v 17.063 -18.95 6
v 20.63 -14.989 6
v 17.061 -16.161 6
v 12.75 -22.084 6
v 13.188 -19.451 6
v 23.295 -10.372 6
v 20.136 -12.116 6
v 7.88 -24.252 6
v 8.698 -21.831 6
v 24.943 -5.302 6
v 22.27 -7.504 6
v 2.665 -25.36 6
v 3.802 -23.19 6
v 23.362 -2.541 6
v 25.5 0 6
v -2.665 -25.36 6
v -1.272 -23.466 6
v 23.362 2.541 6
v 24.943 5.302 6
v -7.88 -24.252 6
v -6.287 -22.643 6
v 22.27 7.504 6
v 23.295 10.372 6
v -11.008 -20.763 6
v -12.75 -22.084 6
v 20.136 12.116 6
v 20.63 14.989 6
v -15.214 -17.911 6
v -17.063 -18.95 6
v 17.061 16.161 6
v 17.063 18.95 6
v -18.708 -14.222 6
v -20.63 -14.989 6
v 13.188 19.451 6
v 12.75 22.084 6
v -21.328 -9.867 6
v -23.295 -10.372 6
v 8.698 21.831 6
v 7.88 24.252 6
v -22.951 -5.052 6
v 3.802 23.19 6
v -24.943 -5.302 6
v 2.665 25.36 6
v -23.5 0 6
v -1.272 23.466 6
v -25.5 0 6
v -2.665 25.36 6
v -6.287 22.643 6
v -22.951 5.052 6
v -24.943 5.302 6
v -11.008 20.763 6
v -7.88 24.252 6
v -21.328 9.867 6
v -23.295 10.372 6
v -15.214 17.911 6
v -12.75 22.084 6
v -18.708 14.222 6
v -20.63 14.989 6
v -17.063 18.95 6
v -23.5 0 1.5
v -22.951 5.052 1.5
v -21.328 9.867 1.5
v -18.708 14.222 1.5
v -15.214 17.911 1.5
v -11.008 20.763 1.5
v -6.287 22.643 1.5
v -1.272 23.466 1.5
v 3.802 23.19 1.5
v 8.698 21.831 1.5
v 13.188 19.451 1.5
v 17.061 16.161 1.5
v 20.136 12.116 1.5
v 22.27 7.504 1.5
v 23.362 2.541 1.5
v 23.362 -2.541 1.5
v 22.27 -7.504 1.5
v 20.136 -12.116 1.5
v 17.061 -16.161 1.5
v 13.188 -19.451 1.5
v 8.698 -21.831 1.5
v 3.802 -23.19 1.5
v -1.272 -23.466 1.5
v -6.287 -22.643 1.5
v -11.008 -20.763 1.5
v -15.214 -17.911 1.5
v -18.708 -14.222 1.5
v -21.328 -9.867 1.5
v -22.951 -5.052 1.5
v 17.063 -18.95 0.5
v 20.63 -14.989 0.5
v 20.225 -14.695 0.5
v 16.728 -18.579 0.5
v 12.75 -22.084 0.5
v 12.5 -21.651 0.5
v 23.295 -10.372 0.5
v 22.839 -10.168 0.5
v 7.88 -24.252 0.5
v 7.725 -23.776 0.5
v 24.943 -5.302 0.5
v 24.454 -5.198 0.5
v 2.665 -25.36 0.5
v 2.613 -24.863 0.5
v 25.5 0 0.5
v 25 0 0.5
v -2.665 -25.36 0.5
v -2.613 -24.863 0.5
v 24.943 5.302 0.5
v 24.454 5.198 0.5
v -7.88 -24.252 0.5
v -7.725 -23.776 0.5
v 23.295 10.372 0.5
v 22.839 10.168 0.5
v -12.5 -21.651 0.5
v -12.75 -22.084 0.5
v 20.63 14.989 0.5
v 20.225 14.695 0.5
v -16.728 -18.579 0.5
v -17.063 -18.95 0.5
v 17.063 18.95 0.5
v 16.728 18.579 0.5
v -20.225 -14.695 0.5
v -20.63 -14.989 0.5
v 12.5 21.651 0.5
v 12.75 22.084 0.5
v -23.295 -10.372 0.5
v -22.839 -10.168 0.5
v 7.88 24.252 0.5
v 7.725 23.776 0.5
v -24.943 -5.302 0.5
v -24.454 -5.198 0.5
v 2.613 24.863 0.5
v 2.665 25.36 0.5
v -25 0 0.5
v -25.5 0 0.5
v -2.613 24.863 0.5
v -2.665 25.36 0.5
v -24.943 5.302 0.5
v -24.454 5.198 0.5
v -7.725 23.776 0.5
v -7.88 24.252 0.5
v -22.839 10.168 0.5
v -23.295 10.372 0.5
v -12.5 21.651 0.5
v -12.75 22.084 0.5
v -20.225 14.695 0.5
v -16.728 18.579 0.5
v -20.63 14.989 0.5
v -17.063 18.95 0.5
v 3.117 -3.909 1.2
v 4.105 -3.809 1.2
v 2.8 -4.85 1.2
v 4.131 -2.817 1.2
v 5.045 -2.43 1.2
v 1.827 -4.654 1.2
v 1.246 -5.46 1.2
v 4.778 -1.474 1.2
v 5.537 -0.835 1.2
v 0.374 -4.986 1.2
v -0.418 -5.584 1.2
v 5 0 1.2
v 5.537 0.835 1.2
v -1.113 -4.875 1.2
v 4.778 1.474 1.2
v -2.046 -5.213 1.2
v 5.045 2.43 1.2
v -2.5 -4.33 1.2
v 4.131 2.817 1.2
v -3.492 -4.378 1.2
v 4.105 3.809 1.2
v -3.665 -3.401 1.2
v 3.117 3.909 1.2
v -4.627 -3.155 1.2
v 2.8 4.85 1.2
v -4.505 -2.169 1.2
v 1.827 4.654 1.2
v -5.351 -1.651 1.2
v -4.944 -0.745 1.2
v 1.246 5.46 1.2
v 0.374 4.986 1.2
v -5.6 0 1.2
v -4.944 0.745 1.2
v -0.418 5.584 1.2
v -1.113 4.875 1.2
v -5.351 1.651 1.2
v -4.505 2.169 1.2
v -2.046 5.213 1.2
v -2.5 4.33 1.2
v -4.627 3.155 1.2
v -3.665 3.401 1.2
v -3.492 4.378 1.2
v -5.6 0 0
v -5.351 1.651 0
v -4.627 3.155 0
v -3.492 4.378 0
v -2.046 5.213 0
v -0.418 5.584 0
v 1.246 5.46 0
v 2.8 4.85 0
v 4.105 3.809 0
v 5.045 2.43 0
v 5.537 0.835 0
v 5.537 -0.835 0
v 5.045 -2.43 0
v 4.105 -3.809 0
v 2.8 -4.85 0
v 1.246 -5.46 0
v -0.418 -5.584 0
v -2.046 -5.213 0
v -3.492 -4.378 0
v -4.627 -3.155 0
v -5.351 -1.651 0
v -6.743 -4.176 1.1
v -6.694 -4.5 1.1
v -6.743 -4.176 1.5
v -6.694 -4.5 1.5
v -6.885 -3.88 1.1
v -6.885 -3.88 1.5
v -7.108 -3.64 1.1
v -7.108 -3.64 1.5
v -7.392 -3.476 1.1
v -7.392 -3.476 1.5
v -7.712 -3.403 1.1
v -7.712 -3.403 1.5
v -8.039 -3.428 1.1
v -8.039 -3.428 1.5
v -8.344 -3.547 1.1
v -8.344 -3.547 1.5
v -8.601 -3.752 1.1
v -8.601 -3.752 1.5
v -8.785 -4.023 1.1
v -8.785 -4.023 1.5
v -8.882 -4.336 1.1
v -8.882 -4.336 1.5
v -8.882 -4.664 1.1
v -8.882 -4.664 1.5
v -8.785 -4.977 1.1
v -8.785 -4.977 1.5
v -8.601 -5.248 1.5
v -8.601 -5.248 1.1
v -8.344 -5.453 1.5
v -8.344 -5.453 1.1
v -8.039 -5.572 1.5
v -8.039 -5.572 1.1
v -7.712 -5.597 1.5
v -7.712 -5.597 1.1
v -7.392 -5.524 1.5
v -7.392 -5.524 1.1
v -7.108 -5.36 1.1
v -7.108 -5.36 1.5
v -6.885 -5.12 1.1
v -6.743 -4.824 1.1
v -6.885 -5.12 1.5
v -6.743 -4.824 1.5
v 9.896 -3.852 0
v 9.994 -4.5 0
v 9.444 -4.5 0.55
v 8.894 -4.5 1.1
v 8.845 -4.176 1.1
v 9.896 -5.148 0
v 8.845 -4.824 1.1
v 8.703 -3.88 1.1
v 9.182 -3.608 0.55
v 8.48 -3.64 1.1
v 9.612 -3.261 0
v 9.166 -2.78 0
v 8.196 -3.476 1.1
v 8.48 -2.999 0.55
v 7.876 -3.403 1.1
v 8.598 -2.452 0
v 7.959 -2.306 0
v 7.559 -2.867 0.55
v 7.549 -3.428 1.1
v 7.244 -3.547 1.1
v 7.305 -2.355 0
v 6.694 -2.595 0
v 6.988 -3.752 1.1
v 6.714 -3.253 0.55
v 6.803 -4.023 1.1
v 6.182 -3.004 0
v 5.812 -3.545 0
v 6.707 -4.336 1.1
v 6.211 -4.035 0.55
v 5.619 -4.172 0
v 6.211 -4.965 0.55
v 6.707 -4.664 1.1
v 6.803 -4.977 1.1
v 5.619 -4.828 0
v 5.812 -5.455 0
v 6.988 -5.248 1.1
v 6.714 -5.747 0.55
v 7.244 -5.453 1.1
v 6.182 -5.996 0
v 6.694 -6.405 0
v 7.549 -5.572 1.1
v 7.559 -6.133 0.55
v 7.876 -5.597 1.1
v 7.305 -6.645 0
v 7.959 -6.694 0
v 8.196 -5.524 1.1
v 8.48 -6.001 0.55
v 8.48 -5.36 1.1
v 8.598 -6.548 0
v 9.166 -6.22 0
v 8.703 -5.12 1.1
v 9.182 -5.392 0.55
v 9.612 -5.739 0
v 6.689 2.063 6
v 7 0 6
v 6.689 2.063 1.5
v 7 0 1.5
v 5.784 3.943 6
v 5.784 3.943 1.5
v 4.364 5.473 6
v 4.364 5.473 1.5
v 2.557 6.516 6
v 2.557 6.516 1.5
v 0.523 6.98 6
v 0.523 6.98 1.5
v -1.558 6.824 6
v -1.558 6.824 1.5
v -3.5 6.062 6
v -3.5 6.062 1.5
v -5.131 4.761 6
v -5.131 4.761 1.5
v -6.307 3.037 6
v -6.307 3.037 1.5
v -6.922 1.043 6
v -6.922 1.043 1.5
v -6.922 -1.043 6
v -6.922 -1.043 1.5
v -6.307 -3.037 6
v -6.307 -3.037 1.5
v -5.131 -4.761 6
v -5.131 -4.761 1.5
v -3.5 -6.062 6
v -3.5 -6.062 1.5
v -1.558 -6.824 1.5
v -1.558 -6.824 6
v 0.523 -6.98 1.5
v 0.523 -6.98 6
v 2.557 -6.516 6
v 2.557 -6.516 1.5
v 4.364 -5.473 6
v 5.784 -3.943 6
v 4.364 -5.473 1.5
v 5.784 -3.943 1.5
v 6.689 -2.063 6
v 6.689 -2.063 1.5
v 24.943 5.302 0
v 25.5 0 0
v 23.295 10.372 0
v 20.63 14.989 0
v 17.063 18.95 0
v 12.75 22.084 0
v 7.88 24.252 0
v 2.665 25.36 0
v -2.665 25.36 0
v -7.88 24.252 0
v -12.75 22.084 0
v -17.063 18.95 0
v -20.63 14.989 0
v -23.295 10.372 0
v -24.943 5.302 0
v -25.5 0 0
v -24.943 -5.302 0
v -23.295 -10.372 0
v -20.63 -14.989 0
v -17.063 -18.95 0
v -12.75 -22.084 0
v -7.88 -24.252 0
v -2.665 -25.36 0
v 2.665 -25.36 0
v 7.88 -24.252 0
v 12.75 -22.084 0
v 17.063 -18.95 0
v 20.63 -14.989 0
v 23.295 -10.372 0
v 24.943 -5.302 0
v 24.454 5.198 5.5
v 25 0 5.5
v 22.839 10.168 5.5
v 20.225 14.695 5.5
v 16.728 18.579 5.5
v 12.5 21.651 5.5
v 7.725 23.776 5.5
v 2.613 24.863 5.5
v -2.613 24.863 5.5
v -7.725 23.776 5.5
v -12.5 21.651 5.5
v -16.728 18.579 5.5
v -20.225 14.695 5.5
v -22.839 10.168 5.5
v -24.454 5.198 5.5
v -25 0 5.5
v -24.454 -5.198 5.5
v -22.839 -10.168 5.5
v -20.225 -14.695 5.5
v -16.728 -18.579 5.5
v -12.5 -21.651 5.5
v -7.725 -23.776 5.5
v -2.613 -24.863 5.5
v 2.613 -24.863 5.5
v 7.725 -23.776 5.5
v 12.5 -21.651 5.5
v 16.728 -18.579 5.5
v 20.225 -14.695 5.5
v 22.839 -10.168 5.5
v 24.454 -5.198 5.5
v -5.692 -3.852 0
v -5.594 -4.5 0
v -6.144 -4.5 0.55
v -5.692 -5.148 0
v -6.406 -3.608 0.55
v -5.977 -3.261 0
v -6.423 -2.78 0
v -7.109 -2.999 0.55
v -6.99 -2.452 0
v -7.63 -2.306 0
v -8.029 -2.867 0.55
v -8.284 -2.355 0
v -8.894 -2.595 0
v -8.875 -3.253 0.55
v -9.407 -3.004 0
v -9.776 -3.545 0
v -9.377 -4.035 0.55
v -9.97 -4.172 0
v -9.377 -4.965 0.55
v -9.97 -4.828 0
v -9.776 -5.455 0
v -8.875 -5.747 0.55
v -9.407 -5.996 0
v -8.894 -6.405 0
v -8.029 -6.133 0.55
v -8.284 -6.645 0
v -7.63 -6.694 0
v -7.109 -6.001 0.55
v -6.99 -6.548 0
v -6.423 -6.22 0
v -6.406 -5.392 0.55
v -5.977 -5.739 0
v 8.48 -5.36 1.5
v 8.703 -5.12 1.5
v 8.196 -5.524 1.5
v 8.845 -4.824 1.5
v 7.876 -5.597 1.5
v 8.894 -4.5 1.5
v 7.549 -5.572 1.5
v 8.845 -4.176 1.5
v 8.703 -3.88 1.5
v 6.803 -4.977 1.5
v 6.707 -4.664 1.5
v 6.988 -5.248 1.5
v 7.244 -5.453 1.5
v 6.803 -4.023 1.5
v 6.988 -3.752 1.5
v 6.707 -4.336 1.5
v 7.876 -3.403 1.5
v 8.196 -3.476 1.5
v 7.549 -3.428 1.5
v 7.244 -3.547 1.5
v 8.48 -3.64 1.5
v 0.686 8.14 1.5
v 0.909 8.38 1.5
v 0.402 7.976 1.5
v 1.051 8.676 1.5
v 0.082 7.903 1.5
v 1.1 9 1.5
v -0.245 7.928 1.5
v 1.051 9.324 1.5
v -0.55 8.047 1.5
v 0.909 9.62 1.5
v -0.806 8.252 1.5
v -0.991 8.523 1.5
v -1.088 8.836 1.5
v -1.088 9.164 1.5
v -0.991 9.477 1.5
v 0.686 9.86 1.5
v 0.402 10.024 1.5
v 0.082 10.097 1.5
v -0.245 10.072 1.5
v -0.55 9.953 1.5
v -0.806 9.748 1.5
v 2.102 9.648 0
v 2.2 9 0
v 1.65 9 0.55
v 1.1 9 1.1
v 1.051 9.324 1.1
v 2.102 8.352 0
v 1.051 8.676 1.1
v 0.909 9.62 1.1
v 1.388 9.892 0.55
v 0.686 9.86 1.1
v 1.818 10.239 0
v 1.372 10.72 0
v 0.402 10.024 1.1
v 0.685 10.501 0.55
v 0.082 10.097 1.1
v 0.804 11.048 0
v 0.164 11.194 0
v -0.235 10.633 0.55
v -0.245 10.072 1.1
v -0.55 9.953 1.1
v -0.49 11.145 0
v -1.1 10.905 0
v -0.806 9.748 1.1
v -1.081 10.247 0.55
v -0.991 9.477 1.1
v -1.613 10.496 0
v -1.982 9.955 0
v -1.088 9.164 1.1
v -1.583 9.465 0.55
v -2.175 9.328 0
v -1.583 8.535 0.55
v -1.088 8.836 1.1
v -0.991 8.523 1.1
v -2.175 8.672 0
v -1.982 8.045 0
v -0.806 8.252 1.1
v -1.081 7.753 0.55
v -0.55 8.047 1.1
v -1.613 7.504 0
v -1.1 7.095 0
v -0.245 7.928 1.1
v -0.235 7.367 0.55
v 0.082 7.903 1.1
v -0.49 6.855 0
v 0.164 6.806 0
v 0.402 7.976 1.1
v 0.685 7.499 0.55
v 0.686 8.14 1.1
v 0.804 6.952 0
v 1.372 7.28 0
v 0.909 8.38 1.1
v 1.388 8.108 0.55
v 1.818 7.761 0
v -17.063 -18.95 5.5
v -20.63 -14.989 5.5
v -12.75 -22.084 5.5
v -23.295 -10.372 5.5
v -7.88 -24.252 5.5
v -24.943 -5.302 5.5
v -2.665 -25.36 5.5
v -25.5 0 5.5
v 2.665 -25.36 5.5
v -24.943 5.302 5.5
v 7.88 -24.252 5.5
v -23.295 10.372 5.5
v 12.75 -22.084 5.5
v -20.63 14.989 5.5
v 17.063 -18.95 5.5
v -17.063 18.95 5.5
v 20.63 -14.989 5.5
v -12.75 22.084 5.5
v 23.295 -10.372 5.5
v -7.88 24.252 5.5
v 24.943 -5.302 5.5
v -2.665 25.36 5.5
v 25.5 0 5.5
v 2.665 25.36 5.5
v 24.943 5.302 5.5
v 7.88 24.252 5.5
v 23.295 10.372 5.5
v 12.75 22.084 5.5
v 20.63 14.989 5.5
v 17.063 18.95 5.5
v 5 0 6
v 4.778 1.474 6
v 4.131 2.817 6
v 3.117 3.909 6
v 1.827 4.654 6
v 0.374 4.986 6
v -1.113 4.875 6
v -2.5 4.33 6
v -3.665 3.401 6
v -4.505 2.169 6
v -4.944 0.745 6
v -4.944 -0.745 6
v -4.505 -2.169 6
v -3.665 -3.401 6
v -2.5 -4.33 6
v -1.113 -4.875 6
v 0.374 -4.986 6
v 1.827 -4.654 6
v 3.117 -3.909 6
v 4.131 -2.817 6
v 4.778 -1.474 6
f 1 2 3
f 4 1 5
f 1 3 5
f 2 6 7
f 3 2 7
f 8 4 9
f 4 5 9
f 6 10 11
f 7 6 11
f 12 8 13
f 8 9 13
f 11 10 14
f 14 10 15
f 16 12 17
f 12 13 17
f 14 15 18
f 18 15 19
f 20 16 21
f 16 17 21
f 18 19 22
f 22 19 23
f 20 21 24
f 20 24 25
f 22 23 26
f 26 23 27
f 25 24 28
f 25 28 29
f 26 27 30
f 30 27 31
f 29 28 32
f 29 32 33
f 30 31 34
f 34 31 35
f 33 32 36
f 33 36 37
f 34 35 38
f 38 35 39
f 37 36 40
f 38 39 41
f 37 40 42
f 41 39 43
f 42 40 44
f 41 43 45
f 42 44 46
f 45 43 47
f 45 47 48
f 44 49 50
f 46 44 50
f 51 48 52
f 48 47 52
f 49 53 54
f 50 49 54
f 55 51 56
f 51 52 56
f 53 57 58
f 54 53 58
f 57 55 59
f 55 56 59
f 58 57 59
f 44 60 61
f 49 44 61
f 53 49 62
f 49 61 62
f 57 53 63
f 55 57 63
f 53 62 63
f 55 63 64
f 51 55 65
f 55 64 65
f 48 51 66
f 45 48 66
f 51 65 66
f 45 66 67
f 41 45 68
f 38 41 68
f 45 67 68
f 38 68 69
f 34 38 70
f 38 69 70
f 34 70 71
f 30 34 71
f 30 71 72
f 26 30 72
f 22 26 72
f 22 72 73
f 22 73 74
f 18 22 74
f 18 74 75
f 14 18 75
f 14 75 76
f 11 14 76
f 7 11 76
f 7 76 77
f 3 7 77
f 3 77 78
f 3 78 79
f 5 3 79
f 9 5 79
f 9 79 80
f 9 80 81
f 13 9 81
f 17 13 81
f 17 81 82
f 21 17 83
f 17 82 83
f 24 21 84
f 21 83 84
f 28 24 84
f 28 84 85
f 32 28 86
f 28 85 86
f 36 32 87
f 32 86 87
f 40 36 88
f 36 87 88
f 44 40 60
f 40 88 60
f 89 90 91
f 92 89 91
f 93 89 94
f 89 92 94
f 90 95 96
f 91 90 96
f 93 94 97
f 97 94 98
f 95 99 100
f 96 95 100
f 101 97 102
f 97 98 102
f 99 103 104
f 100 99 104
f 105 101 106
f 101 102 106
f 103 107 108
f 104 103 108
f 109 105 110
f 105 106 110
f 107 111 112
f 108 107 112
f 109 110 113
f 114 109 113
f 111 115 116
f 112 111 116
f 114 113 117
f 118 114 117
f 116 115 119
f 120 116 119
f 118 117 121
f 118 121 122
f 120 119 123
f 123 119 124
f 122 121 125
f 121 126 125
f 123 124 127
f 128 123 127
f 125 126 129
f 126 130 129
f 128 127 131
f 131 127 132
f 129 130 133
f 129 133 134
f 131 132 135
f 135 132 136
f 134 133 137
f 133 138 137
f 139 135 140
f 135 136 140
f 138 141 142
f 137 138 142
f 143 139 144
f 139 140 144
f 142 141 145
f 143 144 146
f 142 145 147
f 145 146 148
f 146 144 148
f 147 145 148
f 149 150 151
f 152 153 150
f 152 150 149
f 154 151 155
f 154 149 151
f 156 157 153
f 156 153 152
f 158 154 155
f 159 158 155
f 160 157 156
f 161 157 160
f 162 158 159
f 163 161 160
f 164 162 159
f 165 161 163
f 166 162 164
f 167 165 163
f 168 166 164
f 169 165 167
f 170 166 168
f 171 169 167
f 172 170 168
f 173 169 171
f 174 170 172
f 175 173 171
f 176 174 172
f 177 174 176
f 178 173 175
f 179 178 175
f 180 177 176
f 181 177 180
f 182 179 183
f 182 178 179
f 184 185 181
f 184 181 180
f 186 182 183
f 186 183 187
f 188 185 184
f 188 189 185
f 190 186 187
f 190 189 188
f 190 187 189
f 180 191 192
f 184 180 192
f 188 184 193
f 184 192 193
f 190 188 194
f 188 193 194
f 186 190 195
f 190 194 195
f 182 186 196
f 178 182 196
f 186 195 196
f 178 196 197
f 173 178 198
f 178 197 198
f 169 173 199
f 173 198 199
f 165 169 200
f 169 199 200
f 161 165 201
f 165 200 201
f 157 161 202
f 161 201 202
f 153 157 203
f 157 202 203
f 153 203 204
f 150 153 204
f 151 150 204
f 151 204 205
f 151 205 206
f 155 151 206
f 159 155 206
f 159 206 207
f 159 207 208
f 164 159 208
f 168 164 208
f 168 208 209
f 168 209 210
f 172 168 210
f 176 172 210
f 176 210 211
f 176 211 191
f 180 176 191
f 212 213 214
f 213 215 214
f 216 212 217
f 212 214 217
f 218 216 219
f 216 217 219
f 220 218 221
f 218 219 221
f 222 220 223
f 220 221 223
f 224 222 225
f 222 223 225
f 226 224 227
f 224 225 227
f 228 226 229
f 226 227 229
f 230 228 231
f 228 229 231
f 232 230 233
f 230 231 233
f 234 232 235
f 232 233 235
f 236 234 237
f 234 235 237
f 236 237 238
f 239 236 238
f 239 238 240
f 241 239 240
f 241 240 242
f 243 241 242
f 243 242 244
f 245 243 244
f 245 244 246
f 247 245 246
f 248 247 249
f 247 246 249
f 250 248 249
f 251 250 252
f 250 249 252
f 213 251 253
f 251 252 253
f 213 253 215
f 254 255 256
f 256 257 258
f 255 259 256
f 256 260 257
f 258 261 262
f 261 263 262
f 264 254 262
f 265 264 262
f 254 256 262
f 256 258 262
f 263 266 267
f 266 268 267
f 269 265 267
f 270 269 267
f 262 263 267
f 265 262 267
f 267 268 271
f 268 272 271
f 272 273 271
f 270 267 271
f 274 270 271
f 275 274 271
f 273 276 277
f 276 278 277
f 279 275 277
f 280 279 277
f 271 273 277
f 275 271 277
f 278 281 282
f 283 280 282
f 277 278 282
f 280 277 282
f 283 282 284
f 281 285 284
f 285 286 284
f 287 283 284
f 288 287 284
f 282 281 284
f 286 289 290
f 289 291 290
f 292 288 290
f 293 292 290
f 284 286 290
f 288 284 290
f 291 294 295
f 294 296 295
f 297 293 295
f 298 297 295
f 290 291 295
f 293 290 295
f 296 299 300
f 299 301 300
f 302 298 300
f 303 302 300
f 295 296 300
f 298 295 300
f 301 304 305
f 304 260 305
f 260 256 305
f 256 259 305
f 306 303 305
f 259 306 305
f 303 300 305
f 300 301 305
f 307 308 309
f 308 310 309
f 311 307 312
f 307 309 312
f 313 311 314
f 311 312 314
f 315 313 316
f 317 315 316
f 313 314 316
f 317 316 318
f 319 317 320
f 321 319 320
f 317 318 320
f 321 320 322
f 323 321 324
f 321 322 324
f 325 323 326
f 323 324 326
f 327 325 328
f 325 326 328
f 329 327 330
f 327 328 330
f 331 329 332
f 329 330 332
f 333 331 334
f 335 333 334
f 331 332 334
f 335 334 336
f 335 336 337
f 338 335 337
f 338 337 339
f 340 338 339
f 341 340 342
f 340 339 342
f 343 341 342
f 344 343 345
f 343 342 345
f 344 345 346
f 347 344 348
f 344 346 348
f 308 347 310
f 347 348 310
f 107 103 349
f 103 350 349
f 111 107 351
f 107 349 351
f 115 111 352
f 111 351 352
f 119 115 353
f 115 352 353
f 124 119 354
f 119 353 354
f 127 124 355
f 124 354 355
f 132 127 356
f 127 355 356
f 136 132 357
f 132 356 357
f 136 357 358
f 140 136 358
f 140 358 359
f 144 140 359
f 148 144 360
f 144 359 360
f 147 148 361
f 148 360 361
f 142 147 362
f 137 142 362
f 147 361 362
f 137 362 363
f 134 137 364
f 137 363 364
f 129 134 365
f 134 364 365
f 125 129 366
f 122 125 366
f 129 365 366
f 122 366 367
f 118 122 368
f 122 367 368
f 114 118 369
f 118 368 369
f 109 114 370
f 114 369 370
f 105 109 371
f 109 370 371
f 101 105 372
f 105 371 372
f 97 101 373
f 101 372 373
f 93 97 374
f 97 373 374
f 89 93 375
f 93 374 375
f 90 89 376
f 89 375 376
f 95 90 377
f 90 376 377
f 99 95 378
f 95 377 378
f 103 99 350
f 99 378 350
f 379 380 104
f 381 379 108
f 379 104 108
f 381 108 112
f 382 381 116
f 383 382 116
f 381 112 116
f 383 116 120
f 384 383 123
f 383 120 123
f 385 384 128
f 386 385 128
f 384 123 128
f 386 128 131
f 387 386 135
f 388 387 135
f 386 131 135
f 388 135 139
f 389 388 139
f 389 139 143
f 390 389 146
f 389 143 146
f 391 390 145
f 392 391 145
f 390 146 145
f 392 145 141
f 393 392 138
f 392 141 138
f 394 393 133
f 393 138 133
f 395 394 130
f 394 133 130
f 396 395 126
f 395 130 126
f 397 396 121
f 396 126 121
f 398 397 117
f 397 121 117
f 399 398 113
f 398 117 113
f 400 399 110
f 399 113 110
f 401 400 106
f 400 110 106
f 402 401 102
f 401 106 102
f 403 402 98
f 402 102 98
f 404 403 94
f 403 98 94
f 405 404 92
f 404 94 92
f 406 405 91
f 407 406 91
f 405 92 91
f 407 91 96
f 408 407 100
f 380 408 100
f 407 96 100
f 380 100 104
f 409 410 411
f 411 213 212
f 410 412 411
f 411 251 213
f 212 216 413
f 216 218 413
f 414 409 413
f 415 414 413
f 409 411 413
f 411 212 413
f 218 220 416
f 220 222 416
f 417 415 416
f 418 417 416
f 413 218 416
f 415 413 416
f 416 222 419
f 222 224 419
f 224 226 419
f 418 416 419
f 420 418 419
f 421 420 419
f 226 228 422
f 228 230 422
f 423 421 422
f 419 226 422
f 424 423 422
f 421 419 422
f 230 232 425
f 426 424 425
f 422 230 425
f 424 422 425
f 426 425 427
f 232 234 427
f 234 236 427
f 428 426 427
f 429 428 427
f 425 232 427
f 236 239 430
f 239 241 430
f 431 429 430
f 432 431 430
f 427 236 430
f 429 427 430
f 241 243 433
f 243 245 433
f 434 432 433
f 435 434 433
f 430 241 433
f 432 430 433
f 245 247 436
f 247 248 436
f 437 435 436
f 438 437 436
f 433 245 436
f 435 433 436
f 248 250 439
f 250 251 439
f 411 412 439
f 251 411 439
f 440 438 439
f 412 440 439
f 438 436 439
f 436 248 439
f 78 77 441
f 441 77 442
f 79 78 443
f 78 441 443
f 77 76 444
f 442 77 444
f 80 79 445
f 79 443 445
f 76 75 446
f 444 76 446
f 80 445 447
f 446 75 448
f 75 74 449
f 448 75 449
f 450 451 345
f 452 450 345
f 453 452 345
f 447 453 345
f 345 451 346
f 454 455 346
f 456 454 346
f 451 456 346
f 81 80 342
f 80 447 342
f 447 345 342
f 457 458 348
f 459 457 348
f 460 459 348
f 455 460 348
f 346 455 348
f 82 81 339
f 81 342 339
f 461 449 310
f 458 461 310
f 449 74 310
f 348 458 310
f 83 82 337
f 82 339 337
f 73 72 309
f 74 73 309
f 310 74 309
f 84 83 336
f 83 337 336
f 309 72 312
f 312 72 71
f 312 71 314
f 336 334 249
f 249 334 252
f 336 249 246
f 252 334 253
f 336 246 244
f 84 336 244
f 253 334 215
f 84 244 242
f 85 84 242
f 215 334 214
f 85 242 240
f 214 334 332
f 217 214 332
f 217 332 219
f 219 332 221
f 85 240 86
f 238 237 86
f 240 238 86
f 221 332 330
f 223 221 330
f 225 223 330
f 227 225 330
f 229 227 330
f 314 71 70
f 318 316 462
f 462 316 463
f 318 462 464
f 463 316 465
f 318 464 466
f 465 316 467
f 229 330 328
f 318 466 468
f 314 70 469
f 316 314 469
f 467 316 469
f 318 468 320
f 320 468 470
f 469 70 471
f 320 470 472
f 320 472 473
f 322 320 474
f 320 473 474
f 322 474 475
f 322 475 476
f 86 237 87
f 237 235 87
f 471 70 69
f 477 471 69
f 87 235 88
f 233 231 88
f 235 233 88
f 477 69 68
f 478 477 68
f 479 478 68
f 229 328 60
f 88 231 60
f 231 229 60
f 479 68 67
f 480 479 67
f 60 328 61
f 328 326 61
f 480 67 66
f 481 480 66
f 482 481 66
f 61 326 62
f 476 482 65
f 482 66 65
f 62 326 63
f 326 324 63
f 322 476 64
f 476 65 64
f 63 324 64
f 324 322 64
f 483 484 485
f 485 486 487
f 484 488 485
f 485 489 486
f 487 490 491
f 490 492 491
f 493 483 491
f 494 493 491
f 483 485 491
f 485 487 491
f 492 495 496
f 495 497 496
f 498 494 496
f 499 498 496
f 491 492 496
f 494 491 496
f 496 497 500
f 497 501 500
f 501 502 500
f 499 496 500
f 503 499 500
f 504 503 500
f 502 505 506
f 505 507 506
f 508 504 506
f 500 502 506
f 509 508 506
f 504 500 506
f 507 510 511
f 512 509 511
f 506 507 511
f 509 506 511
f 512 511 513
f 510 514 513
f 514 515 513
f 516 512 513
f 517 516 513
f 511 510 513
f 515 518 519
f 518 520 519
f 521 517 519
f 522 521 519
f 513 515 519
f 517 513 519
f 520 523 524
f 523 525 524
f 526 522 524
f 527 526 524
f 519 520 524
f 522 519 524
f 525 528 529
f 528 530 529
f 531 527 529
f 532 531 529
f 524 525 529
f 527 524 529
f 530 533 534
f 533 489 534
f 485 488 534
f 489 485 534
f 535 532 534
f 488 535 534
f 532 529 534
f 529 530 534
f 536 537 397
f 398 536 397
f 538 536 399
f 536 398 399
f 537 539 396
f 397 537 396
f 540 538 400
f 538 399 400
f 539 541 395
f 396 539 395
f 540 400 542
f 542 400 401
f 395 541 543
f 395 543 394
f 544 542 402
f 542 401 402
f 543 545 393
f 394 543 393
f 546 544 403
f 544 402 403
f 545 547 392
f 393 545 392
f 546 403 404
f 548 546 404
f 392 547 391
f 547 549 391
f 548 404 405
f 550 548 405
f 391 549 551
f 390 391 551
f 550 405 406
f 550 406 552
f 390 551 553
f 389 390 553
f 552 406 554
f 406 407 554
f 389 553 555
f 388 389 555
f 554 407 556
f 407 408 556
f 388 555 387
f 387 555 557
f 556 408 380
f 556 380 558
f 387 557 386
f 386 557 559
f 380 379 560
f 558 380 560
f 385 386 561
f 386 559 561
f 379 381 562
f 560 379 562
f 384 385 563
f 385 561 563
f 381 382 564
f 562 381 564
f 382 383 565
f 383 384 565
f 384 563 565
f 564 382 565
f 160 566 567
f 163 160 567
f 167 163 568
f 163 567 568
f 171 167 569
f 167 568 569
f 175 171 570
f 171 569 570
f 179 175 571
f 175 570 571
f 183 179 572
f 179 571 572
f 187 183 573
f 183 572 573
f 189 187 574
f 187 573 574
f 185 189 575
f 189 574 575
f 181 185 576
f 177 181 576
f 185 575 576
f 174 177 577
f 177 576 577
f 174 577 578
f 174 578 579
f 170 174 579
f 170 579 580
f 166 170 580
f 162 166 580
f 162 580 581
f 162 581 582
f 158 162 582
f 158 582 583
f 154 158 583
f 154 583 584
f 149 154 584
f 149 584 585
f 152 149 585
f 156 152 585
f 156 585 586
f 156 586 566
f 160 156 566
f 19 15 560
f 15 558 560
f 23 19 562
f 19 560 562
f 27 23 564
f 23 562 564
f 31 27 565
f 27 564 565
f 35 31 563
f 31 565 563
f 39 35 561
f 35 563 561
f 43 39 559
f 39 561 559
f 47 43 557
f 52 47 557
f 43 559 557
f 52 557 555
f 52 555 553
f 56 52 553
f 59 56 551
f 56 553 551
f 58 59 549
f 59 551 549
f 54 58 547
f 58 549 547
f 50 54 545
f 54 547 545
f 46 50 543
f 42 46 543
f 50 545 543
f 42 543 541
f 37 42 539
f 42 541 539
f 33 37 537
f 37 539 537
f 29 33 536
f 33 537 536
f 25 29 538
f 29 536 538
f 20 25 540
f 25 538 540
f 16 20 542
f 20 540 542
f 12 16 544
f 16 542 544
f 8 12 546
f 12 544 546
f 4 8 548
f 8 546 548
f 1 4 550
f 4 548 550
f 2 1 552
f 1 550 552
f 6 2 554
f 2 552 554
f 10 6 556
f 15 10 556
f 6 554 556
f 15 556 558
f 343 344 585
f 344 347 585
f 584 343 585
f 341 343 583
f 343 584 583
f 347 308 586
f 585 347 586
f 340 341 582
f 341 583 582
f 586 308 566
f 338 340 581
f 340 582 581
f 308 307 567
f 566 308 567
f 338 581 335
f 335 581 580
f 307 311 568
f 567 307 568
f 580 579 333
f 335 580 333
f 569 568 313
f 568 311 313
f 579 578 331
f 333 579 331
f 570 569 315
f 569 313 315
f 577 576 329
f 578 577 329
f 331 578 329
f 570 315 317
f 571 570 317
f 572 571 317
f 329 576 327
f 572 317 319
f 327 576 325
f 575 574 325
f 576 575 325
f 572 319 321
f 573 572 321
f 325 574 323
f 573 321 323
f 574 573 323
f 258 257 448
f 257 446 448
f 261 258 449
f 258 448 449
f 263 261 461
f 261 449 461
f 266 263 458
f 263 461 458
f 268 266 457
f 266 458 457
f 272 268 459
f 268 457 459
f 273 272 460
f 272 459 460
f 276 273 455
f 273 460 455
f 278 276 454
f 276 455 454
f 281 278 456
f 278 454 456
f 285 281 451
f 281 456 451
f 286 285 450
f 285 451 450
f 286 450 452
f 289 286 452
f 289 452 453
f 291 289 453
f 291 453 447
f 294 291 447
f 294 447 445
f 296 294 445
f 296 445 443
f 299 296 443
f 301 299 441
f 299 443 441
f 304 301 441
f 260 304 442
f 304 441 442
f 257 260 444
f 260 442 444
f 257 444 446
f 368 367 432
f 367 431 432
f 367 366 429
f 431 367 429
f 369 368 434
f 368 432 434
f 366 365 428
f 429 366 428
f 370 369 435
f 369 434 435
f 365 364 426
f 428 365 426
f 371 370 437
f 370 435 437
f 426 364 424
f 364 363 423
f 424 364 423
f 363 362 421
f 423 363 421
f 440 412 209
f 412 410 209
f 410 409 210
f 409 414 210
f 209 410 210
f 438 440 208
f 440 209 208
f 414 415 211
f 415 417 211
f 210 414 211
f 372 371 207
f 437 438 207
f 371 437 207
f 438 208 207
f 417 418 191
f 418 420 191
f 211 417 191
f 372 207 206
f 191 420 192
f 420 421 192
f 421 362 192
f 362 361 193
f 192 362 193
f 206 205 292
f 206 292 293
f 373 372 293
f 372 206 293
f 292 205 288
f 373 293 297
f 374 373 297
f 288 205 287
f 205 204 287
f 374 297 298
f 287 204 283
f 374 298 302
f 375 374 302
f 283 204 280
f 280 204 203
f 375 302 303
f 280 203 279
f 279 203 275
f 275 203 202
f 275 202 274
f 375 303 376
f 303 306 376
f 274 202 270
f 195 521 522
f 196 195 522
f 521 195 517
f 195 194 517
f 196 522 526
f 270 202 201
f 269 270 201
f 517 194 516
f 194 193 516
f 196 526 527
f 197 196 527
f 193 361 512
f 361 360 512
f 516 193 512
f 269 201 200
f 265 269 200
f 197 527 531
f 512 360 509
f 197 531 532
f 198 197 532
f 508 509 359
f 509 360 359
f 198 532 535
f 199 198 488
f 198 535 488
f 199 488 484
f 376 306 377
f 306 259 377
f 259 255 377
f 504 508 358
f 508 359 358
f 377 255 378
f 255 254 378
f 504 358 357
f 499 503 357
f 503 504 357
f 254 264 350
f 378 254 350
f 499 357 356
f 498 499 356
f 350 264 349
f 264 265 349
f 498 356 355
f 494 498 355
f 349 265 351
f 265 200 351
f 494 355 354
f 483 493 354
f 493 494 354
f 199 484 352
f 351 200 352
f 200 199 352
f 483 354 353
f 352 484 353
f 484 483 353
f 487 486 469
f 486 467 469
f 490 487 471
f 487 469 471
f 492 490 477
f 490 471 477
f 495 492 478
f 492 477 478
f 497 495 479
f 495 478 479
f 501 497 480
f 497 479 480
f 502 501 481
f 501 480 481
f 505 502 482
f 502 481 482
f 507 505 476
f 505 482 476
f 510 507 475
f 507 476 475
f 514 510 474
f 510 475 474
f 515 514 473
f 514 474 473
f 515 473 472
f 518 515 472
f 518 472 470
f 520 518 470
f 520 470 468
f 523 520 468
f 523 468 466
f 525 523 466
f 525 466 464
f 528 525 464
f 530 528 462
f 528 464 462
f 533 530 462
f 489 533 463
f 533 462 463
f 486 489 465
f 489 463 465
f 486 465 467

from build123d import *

# Parameters (mm, degrees)
M42_CLEARANCE_HOLE1_D                           = 47
M42_CLEARANCE_HOLE1_DEPTH                       = 4.5
SKETCH4_W                                       = 7
SKETCH4_H                                       = 4.5
CSK_FOR_M2_FLAT_HEAD_MACHINE_SCREW1_D           = 2.2
CSK_FOR_M2_FLAT_HEAD_MACHINE_SCREW1_DEPTH       = 6
CSK_FOR_M2_FLAT_HEAD_MACHINE_SCREW1_CSINK_D     = 4.4
CSK_FOR_M2_FLAT_HEAD_MACHINE_SCREW1_CSINK_ANGLE = 90
CBORE_FOR_M8_HEX_HEAD_BOLT1_D                   = 10
CBORE_FOR_M8_HEX_HEAD_BOLT1_DEPTH               = 6
CBORE_FOR_M8_HEX_HEAD_BOLT1_CBORE_D             = 11.2
CBORE_FOR_M8_HEX_HEAD_BOLT1_CBORE_DEPTH         = 1.2


with BuildPart() as part:
    # Sketch1 → Revolve1 (revolve)
    with BuildSketch(Plane(origin=(0, 0, 0), x_dir=(1, 0, 0), z_dir=(0, 1, 0))):
        Polygon((25.5, 0), (0, 0), (0, -6), (25.5, -6), (25.5, -5.5), (25, -5.5), (25, -0.5), (25.5, -0.5), align=None)
    revolve(axis=Axis((0, 0, 0), (0, 0, 1)))

    # M42 Clearance Hole1
    with Locations(Plane.XY.offset(6)):
        with Locations((0, 0)):
            Hole(M42_CLEARANCE_HOLE1_D / 2, depth=M42_CLEARANCE_HOLE1_DEPTH)

    # Sketch4 → Revolve2 (revolve)
    with BuildSketch(Plane(origin=(0, 0, 0), x_dir=(1, 0, 0), z_dir=(0, 1, 0))):
        with Locations((3.5, -3.75)):
            Rectangle(SKETCH4_W, SKETCH4_H)
    revolve(axis=Axis((0, 0, 1.5), (0, 0, 1)))

    # CSK for M2 Flat Head Machine Screw1
    with Locations(Plane(origin=(0, 0, 0), x_dir=(-1, 0, 0), z_dir=(0, 0, -1))):
        with Locations((-7.794228634, -4.5), (7.794228634, -4.5), (0, 9)):
            CounterSinkHole(CSK_FOR_M2_FLAT_HEAD_MACHINE_SCREW1_D / 2, CSK_FOR_M2_FLAT_HEAD_MACHINE_SCREW1_CSINK_D / 2, depth=CSK_FOR_M2_FLAT_HEAD_MACHINE_SCREW1_DEPTH, counter_sink_angle=CSK_FOR_M2_FLAT_HEAD_MACHINE_SCREW1_CSINK_ANGLE)

    # CBORE for M8 Hex Head Bolt1
    with Locations(Plane(origin=(0, 0, 0), x_dir=(-1, 0, 0), z_dir=(0, 0, -1))):
        with Locations((0, 0)):
            CounterBoreHole(CBORE_FOR_M8_HEX_HEAD_BOLT1_D / 2, CBORE_FOR_M8_HEX_HEAD_BOLT1_CBORE_D / 2, CBORE_FOR_M8_HEX_HEAD_BOLT1_CBORE_DEPTH, depth=CBORE_FOR_M8_HEX_HEAD_BOLT1_DEPTH)


solid = part.part
